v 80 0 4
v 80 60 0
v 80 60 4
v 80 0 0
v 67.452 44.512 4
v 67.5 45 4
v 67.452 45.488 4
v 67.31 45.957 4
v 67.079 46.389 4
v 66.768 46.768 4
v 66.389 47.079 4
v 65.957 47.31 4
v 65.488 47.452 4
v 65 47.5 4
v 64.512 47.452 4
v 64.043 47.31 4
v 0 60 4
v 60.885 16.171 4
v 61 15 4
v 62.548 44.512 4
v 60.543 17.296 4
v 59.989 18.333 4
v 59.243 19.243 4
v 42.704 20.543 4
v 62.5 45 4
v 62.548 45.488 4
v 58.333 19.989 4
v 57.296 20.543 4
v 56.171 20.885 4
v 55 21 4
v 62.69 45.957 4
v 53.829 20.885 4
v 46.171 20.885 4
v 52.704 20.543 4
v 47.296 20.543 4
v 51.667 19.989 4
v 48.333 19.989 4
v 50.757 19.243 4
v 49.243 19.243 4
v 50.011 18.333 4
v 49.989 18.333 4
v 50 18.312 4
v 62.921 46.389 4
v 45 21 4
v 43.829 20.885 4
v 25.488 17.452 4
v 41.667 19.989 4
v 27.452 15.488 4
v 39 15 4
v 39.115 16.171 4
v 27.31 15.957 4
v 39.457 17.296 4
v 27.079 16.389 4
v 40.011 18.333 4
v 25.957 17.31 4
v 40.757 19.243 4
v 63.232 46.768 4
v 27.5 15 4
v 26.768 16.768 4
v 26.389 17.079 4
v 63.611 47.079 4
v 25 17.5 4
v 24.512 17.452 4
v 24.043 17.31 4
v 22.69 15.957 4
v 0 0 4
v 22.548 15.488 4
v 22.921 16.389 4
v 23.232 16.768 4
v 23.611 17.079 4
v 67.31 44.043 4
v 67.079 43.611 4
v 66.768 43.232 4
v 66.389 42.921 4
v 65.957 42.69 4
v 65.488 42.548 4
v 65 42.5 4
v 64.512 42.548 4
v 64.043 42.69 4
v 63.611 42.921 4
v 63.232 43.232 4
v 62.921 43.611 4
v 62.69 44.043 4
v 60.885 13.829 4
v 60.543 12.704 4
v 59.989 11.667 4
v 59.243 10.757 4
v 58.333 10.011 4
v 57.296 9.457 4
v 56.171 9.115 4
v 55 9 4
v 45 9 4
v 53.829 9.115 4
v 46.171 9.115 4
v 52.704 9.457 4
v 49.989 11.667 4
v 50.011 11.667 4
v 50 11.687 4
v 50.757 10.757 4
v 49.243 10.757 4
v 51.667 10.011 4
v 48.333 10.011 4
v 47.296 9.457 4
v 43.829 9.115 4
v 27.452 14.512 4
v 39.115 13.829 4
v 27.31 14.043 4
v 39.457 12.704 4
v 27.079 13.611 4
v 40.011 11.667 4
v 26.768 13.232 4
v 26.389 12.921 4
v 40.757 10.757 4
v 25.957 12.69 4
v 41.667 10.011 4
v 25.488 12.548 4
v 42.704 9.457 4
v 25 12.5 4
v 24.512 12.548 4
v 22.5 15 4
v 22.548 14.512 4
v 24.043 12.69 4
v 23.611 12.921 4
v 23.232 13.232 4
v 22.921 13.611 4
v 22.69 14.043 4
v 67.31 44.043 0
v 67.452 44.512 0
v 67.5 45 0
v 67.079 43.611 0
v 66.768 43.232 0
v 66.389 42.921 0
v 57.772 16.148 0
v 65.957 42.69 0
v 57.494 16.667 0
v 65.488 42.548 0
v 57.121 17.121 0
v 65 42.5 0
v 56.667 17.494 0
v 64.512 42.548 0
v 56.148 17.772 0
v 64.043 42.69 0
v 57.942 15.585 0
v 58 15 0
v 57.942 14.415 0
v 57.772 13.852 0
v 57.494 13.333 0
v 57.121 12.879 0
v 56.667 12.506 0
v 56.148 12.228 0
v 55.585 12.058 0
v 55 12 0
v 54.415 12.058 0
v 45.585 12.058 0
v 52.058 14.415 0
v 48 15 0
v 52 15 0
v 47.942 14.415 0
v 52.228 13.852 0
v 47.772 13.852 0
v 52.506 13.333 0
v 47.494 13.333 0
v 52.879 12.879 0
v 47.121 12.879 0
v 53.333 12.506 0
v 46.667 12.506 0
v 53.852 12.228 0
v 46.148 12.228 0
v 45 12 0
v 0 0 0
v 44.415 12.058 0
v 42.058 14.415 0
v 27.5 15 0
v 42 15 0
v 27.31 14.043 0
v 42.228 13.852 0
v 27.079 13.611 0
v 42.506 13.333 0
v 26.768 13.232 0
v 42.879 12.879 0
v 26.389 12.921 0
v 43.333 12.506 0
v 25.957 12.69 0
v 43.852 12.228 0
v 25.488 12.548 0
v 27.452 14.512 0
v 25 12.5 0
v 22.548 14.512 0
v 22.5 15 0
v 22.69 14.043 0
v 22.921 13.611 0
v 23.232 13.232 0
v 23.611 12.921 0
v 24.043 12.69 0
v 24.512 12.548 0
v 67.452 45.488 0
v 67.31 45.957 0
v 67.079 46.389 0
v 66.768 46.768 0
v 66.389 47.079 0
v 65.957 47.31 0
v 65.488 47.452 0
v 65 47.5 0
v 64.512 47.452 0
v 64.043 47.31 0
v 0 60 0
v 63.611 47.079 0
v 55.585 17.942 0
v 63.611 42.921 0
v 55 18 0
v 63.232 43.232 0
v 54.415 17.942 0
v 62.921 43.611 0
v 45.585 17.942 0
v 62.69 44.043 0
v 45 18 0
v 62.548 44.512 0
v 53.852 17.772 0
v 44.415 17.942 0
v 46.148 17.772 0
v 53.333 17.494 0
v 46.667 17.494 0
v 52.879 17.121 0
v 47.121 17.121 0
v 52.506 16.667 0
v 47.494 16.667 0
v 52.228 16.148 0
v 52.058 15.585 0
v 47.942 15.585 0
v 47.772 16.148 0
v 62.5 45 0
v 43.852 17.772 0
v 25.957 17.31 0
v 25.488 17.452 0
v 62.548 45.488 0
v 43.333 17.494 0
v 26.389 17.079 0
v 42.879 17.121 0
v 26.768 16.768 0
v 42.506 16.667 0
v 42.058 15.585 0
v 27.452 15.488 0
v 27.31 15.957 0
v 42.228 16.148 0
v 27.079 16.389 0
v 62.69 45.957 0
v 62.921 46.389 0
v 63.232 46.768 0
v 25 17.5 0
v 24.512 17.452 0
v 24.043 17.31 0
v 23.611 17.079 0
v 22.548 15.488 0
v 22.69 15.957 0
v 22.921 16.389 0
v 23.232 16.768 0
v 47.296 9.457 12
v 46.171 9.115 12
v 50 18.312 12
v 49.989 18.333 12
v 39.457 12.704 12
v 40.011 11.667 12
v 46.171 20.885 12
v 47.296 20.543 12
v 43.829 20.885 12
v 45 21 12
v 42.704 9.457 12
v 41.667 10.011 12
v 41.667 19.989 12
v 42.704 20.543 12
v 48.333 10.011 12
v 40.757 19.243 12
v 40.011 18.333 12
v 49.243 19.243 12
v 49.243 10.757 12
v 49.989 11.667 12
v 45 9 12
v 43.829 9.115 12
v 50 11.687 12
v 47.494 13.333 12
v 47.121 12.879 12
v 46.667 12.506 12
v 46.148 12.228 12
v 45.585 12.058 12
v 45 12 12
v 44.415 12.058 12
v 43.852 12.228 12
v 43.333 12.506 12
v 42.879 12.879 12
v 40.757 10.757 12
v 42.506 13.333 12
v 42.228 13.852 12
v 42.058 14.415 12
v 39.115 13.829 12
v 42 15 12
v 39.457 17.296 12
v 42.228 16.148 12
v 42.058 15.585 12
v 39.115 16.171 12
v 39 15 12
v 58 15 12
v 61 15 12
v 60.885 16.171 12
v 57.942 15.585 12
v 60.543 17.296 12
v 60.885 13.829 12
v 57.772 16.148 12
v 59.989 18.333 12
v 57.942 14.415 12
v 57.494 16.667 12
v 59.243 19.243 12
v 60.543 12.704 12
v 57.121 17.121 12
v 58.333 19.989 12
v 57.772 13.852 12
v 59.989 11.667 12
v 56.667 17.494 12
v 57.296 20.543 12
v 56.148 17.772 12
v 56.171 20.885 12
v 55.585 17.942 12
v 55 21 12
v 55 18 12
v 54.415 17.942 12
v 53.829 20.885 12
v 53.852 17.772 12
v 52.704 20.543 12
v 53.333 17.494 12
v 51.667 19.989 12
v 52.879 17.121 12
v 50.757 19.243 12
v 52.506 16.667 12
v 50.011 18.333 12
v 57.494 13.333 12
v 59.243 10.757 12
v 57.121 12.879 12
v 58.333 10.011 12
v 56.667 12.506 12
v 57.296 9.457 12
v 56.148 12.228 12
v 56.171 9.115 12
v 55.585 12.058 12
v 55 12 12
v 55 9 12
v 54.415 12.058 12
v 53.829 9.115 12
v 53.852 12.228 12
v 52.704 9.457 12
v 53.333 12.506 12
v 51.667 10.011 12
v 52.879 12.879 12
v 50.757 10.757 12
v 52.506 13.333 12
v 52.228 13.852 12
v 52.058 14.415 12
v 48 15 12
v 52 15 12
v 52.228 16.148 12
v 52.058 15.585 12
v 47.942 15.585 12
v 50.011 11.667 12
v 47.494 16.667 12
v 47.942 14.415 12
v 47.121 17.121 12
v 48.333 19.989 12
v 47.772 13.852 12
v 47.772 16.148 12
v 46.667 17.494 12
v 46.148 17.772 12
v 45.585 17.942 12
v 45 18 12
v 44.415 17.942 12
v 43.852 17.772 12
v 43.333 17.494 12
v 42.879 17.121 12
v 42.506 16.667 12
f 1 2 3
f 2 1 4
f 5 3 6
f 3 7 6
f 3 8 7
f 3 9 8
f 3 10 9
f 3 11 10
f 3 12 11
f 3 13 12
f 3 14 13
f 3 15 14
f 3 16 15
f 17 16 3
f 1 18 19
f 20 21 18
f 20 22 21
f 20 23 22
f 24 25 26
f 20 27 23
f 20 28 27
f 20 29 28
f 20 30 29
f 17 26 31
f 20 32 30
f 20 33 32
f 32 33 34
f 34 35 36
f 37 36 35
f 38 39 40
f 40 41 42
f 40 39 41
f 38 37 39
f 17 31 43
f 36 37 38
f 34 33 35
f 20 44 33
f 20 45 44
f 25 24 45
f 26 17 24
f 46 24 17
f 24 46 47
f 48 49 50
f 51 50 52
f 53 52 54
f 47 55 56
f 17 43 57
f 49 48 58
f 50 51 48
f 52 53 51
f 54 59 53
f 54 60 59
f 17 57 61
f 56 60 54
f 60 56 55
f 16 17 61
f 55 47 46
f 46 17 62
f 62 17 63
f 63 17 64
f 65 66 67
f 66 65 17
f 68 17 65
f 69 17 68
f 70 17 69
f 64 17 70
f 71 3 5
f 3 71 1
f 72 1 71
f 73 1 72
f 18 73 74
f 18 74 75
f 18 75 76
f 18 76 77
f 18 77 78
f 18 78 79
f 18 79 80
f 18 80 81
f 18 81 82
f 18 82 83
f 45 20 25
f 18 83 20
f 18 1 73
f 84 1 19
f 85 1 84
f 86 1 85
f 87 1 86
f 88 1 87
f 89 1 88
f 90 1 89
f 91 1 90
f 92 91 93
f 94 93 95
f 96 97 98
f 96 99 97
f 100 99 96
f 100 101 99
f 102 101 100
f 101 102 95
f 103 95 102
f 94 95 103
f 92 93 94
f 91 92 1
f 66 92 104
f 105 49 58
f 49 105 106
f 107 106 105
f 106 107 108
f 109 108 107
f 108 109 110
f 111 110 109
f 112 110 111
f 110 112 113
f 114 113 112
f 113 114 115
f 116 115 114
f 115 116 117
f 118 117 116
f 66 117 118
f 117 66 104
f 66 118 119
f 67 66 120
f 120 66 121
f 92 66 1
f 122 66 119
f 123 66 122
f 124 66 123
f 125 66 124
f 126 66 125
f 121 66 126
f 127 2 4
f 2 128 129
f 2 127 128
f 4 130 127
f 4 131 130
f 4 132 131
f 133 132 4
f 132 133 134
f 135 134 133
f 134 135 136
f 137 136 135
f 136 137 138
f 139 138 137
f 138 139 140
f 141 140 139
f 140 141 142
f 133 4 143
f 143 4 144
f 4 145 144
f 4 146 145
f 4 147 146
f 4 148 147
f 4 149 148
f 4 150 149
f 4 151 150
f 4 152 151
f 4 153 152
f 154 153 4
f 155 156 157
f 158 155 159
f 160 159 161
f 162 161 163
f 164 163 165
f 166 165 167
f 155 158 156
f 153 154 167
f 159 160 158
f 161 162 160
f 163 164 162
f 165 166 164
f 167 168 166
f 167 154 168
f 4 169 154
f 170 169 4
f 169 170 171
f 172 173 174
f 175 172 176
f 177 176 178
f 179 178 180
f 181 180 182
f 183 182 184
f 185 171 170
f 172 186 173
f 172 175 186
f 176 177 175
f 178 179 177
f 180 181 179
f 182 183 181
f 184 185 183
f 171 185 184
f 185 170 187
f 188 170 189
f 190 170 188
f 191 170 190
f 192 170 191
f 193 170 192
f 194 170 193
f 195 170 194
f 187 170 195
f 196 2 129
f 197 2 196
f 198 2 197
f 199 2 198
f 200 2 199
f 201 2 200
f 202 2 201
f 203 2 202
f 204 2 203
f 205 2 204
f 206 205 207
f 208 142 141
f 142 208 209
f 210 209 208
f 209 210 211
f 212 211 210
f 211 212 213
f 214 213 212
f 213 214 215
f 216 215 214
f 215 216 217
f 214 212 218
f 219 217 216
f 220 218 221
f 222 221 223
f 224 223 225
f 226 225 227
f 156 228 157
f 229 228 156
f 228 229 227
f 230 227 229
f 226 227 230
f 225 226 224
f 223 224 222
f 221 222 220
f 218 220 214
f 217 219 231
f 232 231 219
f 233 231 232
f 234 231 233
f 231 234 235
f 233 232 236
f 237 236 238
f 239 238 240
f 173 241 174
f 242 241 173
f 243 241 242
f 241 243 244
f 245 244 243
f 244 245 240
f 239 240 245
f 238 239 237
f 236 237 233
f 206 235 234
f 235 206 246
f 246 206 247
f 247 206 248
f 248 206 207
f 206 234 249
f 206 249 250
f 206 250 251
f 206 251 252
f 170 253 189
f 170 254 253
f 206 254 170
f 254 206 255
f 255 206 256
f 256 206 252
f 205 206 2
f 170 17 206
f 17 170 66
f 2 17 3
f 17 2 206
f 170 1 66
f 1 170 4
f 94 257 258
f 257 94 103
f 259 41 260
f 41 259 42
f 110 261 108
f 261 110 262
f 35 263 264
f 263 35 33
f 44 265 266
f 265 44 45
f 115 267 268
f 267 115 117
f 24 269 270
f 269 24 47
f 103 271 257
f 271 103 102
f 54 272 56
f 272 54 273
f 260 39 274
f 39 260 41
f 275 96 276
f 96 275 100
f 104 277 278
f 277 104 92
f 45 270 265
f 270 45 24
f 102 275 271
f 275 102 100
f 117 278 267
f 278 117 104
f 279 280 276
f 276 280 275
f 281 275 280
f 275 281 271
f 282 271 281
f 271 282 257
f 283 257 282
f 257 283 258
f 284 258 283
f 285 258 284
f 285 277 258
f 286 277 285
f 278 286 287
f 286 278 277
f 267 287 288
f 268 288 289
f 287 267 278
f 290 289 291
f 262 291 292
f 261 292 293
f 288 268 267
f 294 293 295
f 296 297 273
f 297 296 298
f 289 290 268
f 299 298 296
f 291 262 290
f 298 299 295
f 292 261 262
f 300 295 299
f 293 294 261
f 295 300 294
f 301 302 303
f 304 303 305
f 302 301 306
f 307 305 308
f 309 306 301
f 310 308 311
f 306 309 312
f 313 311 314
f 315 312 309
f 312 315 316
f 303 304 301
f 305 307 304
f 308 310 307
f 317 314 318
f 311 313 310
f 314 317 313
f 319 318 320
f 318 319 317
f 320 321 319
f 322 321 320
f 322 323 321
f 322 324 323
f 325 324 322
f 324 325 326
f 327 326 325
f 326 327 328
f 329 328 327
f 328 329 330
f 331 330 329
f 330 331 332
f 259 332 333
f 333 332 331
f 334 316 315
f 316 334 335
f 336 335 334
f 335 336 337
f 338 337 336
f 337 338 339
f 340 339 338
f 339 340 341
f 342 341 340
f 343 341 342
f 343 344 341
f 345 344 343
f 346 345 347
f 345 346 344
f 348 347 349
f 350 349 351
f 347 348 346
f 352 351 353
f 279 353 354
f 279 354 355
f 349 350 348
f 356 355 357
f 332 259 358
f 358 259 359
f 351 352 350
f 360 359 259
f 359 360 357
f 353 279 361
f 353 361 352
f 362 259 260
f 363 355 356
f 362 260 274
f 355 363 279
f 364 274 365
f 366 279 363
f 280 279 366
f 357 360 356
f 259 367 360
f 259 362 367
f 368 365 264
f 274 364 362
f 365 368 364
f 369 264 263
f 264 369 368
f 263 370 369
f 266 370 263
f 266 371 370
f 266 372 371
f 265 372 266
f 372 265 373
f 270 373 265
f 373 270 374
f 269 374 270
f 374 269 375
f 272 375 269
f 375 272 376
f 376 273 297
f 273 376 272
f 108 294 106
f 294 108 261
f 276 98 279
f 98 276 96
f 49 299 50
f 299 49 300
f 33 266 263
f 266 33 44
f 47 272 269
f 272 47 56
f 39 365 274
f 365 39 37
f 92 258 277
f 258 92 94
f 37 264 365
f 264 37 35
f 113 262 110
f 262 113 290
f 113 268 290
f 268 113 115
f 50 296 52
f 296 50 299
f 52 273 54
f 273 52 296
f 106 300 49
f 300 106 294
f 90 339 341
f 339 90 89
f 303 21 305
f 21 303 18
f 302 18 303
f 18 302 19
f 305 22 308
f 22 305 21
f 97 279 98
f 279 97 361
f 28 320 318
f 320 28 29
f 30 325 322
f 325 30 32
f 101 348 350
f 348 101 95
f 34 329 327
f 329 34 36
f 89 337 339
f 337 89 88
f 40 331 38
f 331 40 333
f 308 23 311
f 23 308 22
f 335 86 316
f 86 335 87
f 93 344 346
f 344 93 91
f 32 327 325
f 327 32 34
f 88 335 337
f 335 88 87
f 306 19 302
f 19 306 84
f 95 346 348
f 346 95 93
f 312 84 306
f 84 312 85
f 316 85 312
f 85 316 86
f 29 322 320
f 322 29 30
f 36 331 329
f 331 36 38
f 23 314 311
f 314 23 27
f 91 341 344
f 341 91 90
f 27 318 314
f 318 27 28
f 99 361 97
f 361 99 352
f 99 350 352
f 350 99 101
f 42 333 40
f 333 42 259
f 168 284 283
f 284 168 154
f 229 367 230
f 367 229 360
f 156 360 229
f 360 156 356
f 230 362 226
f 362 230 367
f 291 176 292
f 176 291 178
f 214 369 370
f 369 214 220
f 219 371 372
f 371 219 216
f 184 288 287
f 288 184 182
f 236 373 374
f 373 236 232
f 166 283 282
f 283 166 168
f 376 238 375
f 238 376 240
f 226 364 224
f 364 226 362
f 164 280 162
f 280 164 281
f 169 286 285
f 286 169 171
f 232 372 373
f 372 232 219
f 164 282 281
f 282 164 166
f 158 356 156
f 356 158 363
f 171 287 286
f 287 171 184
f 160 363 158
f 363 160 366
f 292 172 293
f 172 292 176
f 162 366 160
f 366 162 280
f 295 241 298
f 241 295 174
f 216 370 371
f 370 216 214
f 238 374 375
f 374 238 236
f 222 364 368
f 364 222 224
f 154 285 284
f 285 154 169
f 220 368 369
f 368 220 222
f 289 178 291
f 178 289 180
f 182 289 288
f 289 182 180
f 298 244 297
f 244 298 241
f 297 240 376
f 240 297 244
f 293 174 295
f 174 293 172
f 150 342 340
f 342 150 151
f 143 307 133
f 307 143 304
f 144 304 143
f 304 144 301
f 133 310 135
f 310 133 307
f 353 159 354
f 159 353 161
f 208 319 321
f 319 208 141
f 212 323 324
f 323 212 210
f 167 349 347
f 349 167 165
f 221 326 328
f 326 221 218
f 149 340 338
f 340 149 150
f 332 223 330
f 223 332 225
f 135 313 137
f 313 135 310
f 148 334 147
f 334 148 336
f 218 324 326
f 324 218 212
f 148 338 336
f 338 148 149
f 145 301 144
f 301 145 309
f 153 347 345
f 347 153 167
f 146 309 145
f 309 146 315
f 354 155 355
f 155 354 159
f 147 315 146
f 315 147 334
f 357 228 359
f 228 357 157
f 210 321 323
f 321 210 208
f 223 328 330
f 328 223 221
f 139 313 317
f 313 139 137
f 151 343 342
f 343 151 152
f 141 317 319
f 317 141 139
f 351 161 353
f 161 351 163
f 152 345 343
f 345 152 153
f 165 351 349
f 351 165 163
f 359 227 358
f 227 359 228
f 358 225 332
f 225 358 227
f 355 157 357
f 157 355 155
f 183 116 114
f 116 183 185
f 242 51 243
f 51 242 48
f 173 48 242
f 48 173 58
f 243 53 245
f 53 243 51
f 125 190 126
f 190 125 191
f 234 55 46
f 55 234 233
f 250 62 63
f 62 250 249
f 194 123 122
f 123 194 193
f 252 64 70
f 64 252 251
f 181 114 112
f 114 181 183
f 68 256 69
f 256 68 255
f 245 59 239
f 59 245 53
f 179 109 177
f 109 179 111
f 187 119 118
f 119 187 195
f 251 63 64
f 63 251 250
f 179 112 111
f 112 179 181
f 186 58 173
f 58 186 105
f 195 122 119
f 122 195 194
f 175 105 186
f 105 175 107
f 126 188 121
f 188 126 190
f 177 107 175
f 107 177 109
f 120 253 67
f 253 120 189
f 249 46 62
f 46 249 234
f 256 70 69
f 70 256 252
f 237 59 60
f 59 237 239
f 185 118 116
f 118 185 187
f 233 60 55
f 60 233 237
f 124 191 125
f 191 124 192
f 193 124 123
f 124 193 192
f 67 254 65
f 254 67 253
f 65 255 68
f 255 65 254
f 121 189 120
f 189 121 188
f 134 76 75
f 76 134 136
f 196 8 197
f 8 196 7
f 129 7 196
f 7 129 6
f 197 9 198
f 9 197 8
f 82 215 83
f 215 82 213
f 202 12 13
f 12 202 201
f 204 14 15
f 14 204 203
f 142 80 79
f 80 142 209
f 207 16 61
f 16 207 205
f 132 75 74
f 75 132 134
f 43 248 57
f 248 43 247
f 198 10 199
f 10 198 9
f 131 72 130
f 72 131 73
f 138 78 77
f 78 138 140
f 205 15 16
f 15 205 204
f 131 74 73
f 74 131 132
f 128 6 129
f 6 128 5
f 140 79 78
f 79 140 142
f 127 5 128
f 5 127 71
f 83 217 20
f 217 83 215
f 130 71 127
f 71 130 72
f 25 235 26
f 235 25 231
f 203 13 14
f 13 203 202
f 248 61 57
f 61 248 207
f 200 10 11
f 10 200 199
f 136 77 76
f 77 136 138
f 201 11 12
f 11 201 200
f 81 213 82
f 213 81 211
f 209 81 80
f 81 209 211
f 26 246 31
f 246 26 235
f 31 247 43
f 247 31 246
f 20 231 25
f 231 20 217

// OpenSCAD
$fn = 32;

// ----------------------------------------------------------------------
// Mixed field: bosses and holes at given coordinates
// ----------------------------------------------------------------------

// --- parameters (mm) ---
plate_l = 80;             // plate length, X
plate_w = 60;             // plate width, Y
plate_t = 4;              // plate thickness, Z
boss_d = 12;              // boss diameter
boss_h = 8;               // boss height above the plate
hole_d = 5;               // through hole diameter
fit_tol = 0.02;           // tolerance for press fits, mm
free_tol = 0.2;           // tolerance for clearance fits, mm

total_h = plate_t + boss_h;  // overall height

difference() {
  union() {
    cube([plate_l, plate_w, plate_t]);
    translate([45, 15, plate_t]) cylinder(h = boss_h, d = boss_d);
    translate([55, 15, plate_t]) cylinder(h = boss_h, d = boss_d);
  }
  translate([45, 15, -1]) cylinder(h = total_h + 2, d = boss_d / 2);
  translate([55, 15, -1]) cylinder(h = total_h + 2, d = boss_d / 2);
  translate([25, 15, -1]) cylinder(h = plate_t + 2, d = hole_d);
  translate([65, 45, -1]) cylinder(h = plate_t + 2, d = hole_d);
}
